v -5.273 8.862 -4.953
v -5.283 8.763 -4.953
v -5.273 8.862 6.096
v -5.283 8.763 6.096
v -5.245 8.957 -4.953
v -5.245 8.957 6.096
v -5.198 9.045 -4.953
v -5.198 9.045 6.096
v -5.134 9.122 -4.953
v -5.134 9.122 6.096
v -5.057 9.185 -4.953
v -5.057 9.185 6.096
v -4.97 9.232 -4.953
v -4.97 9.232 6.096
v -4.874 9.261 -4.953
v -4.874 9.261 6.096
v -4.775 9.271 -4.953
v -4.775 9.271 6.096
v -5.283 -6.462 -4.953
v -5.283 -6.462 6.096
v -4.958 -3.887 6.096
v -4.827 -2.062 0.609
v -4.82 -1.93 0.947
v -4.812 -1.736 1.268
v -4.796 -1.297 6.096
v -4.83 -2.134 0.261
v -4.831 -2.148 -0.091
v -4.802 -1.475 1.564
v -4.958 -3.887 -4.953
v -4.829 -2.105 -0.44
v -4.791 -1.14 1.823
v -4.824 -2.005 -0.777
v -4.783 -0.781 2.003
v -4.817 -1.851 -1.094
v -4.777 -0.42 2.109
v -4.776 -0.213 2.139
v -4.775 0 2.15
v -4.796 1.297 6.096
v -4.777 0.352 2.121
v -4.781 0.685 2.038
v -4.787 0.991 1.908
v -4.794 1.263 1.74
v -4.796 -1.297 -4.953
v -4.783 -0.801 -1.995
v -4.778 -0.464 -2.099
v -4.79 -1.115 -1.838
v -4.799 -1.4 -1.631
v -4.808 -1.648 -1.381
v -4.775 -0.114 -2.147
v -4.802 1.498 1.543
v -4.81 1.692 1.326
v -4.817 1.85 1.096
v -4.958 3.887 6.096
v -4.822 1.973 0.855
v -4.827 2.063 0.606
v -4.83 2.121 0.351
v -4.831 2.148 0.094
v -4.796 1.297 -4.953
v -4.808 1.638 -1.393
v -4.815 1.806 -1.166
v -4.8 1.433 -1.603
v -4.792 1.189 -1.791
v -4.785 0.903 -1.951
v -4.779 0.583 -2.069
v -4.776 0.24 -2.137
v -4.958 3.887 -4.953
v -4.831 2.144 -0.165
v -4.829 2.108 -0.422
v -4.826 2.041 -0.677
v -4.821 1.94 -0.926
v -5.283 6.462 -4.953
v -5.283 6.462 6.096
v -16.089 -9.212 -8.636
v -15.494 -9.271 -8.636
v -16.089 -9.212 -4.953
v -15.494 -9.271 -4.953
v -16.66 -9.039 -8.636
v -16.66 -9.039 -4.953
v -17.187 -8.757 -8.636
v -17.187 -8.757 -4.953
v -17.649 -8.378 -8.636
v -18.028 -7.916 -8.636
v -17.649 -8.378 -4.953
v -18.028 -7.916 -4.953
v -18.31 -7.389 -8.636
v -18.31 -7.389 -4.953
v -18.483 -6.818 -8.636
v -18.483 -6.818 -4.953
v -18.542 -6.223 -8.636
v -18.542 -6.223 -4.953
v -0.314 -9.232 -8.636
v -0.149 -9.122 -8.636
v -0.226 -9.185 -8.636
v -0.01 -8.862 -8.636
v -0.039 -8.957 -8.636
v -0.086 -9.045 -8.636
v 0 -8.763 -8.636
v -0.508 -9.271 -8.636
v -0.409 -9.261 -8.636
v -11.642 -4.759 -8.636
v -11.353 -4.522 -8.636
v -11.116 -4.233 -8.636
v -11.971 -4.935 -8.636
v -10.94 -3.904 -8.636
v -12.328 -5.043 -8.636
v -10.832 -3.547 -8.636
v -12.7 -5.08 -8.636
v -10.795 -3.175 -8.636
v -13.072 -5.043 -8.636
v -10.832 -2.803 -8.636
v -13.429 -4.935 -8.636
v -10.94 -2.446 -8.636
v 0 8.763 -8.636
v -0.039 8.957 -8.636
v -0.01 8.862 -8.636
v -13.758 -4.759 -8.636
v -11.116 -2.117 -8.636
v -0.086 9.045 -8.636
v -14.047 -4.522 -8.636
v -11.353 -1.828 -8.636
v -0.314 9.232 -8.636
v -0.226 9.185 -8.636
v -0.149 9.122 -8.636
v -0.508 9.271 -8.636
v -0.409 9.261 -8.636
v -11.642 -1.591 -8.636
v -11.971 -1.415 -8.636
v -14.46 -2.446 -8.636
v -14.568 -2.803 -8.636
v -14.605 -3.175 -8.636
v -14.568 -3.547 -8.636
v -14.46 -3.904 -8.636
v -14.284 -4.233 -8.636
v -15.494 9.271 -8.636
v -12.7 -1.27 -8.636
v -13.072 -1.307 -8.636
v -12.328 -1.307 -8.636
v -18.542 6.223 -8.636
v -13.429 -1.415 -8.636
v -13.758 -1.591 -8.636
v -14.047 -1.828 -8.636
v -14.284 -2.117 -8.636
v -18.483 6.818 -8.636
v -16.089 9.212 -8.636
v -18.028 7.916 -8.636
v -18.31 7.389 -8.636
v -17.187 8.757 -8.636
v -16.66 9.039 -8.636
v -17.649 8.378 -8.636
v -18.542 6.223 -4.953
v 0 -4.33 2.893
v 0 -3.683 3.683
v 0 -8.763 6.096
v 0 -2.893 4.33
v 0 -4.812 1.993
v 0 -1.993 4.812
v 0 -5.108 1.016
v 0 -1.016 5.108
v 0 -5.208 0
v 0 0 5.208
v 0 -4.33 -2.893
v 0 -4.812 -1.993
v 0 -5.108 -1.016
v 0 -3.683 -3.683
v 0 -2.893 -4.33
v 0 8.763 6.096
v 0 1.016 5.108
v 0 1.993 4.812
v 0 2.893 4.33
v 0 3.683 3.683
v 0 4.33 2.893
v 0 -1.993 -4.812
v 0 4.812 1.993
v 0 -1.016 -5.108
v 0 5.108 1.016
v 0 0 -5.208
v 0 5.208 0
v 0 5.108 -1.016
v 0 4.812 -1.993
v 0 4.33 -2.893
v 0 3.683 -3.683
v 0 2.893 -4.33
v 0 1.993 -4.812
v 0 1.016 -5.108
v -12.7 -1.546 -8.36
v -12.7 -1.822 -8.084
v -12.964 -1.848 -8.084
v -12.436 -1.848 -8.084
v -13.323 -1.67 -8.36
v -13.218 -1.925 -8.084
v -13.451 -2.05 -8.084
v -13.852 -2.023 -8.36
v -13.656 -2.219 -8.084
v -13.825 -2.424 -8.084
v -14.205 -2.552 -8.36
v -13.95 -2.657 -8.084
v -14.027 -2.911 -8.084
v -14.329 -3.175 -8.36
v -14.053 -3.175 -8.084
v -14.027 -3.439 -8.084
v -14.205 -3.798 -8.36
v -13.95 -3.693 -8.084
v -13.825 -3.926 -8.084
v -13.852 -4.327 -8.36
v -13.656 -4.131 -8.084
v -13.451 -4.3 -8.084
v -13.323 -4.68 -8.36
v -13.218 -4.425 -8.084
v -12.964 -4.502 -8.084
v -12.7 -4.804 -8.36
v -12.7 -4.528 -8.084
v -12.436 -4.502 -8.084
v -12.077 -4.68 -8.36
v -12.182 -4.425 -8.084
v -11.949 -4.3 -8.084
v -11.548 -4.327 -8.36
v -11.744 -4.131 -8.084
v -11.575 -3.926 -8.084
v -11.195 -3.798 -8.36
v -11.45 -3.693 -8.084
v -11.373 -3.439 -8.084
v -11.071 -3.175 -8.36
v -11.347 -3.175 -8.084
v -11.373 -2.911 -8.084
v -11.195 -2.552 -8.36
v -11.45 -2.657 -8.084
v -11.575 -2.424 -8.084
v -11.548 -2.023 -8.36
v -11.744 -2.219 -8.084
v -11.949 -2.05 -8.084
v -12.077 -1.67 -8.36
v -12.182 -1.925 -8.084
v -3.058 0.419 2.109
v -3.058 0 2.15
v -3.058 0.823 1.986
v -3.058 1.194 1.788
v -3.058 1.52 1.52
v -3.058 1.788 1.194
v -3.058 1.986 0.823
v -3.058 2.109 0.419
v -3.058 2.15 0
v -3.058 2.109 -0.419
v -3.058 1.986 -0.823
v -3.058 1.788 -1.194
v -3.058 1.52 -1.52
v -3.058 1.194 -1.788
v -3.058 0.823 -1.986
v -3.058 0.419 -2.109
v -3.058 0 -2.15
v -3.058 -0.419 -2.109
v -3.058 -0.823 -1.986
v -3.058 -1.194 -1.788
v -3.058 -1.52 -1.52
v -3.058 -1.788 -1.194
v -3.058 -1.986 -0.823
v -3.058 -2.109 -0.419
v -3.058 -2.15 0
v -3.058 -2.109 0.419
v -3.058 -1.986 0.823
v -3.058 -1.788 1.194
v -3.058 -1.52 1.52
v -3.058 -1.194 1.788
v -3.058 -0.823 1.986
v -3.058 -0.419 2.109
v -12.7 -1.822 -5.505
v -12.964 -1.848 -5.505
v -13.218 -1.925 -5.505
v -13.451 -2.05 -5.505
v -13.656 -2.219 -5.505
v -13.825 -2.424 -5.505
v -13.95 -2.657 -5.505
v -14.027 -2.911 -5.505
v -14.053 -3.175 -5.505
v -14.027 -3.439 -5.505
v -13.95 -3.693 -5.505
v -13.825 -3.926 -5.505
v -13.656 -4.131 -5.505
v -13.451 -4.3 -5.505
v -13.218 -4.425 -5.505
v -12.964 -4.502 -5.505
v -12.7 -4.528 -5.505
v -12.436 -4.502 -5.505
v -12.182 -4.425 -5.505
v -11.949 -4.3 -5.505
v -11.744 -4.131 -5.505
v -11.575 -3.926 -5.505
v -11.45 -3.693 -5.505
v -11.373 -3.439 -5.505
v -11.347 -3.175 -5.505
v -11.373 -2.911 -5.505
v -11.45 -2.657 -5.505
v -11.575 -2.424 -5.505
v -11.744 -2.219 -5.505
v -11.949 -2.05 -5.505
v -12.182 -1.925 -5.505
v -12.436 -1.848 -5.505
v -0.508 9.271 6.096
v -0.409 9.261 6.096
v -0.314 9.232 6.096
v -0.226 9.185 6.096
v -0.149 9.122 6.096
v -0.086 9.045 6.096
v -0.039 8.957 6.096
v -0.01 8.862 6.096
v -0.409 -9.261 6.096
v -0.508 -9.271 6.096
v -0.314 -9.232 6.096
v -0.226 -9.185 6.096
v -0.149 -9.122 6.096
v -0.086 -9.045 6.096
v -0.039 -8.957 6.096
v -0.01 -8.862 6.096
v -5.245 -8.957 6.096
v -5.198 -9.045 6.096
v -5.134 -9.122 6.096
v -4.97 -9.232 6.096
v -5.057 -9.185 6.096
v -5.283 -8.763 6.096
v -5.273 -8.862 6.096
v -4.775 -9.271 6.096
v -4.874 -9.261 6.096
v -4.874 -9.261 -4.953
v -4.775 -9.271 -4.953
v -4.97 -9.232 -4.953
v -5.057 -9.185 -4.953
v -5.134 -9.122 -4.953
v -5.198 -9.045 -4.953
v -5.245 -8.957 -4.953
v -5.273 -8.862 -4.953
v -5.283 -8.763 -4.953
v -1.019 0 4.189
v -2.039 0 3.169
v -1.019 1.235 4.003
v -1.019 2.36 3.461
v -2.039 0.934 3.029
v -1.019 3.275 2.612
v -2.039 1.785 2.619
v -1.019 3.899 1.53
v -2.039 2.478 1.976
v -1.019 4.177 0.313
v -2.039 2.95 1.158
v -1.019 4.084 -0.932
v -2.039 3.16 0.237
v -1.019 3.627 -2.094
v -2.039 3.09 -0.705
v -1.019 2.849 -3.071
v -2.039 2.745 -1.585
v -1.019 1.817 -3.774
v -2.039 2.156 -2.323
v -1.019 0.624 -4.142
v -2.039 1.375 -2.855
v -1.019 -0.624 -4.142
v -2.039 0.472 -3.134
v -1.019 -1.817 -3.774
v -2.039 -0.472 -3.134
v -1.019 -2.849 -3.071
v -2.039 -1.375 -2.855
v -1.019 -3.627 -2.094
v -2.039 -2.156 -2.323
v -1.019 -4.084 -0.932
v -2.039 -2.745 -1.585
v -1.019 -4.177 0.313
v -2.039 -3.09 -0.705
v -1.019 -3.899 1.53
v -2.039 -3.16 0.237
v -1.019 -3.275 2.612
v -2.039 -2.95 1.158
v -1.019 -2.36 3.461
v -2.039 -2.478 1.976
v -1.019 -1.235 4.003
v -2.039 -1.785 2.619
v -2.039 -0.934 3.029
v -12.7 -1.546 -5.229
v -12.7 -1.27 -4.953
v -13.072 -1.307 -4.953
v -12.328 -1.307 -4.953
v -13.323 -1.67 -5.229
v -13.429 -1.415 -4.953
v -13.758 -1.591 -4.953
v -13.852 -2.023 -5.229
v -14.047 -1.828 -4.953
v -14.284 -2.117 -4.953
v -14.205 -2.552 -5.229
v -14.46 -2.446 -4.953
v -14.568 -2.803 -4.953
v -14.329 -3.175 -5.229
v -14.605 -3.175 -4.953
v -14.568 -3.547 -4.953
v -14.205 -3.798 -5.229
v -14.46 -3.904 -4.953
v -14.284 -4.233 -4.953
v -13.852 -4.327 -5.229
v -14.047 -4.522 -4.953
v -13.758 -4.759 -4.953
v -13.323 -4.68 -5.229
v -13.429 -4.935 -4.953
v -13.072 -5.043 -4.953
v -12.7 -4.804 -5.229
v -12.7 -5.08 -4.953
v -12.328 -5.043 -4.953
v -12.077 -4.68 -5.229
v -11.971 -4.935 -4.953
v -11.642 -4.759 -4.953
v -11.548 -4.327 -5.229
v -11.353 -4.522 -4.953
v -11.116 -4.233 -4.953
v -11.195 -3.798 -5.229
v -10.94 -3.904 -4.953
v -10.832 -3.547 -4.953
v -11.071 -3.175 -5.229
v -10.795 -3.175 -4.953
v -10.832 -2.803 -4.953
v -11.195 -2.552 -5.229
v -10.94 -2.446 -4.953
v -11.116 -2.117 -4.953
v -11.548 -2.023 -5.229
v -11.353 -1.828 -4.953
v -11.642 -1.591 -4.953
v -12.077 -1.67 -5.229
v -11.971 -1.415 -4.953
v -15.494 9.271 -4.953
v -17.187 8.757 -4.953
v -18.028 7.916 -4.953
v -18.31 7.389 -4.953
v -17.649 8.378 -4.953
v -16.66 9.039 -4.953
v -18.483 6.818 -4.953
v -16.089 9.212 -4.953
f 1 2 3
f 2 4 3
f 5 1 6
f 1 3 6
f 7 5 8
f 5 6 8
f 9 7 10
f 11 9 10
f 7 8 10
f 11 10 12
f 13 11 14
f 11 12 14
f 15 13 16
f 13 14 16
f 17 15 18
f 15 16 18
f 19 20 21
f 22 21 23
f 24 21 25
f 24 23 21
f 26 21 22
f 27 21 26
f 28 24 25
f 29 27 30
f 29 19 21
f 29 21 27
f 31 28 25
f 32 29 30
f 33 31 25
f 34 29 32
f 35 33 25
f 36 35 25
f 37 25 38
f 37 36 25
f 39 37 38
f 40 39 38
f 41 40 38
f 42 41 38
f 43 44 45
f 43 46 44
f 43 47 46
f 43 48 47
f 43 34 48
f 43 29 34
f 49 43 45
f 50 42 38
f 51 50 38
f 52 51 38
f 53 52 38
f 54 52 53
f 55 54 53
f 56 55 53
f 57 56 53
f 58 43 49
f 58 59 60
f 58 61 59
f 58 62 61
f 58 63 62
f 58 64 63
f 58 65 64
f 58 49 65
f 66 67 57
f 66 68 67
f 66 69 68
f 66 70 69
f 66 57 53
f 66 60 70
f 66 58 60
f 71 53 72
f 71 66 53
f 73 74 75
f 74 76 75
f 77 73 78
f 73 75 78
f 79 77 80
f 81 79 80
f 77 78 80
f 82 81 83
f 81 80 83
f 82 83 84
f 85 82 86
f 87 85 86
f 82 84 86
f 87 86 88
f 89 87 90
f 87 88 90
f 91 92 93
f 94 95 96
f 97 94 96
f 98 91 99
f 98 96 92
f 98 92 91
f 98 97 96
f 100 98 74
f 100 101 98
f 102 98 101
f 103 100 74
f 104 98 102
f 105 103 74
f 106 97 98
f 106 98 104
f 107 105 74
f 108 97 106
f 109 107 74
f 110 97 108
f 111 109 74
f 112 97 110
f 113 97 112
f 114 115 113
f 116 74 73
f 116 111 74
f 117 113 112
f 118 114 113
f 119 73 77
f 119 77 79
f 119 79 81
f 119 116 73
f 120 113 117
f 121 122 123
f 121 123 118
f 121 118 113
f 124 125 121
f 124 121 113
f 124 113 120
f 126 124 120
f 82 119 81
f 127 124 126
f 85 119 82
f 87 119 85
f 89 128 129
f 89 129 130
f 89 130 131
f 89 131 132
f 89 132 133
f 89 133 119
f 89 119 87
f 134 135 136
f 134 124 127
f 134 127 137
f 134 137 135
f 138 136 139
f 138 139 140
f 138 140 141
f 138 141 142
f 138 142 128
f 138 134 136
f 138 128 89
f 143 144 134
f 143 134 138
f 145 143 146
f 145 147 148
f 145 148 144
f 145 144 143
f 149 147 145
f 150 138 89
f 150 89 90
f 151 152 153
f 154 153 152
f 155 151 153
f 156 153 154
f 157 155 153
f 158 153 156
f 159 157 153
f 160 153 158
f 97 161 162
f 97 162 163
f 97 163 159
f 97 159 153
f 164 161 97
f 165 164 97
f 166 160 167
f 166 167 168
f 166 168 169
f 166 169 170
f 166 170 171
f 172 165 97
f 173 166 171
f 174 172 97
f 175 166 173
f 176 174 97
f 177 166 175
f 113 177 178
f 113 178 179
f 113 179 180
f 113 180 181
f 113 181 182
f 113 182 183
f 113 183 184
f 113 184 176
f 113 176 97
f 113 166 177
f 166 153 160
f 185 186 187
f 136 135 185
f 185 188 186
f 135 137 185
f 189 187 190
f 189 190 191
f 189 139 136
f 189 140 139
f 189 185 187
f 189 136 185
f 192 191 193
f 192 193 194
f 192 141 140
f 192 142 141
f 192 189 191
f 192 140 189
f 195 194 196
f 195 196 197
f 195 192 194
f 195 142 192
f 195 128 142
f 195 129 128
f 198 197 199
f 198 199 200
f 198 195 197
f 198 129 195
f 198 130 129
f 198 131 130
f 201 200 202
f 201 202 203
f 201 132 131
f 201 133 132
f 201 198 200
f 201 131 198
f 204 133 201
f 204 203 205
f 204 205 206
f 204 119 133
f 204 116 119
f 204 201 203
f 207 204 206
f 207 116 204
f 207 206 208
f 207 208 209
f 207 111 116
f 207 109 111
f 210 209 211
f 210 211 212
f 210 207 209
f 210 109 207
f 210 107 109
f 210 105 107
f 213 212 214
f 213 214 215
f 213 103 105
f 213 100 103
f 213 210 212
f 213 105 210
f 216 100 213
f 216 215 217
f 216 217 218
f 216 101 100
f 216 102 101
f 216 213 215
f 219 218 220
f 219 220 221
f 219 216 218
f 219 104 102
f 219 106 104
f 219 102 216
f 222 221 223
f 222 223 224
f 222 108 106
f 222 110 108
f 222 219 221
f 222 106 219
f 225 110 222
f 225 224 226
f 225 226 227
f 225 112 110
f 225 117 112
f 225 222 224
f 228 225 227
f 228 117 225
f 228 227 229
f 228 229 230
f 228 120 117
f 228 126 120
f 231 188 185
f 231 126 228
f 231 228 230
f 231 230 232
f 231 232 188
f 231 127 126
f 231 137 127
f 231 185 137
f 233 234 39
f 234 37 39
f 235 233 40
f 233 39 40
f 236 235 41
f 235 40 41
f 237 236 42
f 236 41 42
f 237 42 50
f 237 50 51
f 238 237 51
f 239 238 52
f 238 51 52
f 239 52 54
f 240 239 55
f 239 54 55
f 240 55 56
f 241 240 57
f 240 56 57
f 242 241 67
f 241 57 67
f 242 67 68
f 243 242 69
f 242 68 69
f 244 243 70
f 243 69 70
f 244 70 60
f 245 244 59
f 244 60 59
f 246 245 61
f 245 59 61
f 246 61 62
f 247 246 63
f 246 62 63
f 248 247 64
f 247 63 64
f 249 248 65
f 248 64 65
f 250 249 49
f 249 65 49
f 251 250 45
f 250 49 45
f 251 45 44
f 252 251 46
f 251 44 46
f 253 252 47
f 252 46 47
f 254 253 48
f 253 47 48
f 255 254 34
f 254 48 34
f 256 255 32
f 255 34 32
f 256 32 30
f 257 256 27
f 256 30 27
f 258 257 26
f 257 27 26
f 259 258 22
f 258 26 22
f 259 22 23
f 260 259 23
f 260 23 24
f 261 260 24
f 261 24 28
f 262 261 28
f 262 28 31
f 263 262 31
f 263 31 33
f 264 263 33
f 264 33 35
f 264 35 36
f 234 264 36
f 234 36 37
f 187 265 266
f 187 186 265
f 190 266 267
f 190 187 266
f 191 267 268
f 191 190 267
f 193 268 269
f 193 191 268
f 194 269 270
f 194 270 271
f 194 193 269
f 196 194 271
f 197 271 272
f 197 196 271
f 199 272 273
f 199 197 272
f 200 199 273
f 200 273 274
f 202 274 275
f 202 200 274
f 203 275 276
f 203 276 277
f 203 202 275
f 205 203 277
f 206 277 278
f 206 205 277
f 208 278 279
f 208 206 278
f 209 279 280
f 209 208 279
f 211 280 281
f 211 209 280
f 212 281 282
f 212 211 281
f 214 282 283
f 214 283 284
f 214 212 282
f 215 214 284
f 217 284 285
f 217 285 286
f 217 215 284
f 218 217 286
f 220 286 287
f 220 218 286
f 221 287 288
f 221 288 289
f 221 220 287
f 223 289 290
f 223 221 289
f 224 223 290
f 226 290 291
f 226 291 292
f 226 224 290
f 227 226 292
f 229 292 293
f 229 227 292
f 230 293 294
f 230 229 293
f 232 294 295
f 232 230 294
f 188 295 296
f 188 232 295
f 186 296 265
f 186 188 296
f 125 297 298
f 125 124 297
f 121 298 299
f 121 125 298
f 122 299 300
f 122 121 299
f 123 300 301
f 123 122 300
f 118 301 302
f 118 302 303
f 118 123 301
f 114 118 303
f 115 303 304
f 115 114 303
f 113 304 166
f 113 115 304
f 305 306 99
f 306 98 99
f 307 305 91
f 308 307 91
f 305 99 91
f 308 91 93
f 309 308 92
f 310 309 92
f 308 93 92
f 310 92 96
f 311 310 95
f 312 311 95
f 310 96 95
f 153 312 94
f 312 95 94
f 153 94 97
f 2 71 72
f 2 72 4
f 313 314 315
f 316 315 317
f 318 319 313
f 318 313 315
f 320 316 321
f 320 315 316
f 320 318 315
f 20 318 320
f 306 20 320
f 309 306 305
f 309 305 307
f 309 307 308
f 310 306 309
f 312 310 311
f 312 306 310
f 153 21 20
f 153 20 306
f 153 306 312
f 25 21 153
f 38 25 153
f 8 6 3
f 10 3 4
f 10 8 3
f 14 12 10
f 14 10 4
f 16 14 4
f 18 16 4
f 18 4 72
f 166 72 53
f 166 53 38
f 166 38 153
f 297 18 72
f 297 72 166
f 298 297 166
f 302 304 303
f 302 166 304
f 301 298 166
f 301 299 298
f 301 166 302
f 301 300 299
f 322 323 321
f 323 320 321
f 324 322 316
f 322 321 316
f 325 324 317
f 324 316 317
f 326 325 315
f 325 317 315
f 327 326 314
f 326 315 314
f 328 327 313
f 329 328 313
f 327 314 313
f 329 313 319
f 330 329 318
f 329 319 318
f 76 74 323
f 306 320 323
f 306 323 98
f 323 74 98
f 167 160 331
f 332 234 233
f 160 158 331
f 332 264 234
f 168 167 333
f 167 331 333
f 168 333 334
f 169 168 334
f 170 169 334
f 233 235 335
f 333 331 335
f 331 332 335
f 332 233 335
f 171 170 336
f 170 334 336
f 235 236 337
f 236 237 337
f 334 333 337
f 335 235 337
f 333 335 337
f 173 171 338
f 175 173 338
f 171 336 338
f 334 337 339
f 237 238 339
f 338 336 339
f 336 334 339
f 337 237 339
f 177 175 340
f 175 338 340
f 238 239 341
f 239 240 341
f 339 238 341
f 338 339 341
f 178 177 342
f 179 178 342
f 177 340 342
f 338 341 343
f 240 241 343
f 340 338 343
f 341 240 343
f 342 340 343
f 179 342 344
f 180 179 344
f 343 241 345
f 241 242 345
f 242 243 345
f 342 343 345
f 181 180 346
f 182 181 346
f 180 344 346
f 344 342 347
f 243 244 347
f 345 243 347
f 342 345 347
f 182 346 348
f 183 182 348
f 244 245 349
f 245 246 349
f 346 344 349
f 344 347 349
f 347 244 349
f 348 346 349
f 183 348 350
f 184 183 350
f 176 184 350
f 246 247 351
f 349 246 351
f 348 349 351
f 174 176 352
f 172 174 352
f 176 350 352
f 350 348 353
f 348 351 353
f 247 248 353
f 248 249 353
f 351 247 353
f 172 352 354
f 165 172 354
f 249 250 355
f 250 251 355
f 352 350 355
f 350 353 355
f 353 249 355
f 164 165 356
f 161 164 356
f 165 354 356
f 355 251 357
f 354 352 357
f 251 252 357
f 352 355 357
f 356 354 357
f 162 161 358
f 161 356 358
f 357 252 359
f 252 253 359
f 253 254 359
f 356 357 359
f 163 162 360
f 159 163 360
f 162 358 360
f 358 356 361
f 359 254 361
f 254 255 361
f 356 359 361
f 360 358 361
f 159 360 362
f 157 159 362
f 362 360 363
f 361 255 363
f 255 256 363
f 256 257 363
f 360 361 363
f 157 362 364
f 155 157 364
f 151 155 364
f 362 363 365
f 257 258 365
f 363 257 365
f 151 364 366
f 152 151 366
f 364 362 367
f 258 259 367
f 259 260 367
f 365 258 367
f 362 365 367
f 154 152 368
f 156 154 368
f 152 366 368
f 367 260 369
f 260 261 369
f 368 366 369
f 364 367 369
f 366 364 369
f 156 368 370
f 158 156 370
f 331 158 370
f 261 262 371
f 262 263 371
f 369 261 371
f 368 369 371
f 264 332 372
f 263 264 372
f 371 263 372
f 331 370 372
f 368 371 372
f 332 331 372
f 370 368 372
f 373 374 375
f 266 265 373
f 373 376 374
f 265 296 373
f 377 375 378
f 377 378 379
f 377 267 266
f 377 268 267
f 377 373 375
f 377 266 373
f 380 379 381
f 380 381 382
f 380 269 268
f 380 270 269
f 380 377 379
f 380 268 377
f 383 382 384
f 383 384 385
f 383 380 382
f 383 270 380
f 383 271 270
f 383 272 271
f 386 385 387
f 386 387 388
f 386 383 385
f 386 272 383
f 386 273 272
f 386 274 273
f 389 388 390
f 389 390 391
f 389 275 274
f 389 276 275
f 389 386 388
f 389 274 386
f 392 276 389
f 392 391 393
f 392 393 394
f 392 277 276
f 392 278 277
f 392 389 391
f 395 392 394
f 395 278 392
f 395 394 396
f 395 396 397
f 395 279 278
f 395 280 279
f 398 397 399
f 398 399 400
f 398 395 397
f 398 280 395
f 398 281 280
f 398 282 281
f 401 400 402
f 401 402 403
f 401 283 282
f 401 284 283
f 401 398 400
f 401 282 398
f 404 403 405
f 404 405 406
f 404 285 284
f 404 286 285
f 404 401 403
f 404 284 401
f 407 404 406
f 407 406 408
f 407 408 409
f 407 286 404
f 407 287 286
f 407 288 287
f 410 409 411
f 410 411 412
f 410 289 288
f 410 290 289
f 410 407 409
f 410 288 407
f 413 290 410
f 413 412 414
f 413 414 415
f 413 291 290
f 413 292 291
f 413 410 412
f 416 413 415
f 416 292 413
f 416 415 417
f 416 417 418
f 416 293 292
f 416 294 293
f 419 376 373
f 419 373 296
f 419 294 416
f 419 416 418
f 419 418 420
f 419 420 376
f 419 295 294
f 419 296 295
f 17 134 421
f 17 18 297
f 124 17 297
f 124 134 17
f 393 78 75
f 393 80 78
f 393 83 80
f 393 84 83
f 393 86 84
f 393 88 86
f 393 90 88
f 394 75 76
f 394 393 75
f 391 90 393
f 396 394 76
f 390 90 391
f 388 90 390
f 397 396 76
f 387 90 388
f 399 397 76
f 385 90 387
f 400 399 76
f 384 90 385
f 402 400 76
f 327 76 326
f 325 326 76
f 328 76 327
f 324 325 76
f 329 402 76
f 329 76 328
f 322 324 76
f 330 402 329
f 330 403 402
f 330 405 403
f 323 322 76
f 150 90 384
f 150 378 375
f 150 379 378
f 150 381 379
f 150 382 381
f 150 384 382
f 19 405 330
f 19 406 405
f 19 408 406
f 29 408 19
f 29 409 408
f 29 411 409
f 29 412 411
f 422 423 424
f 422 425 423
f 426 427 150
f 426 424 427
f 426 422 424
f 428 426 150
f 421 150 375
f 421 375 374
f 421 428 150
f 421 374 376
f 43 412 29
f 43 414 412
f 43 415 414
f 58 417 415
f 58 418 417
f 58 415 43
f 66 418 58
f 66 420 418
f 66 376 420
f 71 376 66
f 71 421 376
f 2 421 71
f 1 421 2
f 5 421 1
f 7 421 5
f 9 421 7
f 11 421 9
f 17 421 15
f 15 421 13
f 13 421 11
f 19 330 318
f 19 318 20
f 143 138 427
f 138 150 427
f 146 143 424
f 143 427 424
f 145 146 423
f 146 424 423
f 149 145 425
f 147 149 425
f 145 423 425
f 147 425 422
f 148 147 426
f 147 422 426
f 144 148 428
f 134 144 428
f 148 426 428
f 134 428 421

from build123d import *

# Parameters (mm, degrees)
BOSS_EXTRUDE1_DEPTH                             = 9.271
CUT_EXTRUDE1_DEPTH                              = 24.491224021
CSK_FOR_M4_FLAT_HEAD_MACHINE_SCREW1_D           = 4.3
CSK_FOR_M4_FLAT_HEAD_MACHINE_SCREW1_CSINK_D     = 10.416
CSK_FOR_M4_FLAT_HEAD_MACHINE_SCREW1_CSINK_ANGLE = 90
FILLET2_R                                       = 3.048
FILLET3_R                                       = 0.508


with BuildPart() as part:
    # Sketch1 → Boss-Extrude1 (new, symmetric)
    with BuildSketch(Plane(origin=(0, 0, 0), x_dir=(1, 0, 0), z_dir=(0, 1, 0))):
        Polygon((-18.542, 4.953), (-7.62, 4.953), (-7.62, -6.096), (0, -6.096), (0, 8.636), (-18.542, 8.636), align=None)
    extrude(amount=BOSS_EXTRUDE1_DEPTH, both=True)

    # Sketch2 → Cut-Extrude1 (cut, through all)
    with BuildSketch(Plane(origin=(0, 0, -4.953), x_dir=(-1, 0, 0), z_dir=(0, 0, -1))):
        with BuildLine():
            Line((5.2832, 6.46179195), (5.2832, 15.24))
            Line((5.2832, 15.24), (52.002170663, 15.24))
            Line((52.002170663, 15.24), (52.002170663, -15.24))
            Line((52.002170663, -15.24), (5.2832, -15.24))
            Line((5.2832, -15.24), (5.2832, -6.46179195))
            ThreePointArc((5.2832, -6.46179195), (4.7752, 0), (5.2832, 6.46179195))
        make_face()
    extrude(amount=-CUT_EXTRUDE1_DEPTH, mode=Mode.SUBTRACT)

    # CSK for M4 Flat Head Machine Screw1 (through all)
    with Locations(Plane(origin=(0, 0, 0), x_dir=(0, 0, -1), z_dir=(1, 0, 0))):
        with Locations((0, 0)):
            CounterSinkHole(CSK_FOR_M4_FLAT_HEAD_MACHINE_SCREW1_D / 2, CSK_FOR_M4_FLAT_HEAD_MACHINE_SCREW1_CSINK_D / 2, counter_sink_angle=CSK_FOR_M4_FLAT_HEAD_MACHINE_SCREW1_CSINK_ANGLE)

    # Sketch5 → #6-32 Tapped Hole1 (revolve, cut)
    with BuildSketch(Plane(origin=(-12.7, -3.175, -8.636), x_dir=(0, 1, 0), z_dir=(1, 0, 0))):
        Polygon((0, 0), (0, 3.683), (1.905, 3.683), (1.35255, 3.13055), (1.35255, 0.55245), (1.905, 0), align=None)
    revolve(axis=Axis((-12.7, -3.175, -14.986), (0, 0, 1)), mode=Mode.SUBTRACT)

    # Fillet2
    fillet2_edges = [part.edges().sort_by_distance(p)[0] for p in [
        (-18.542, 9.271, -6.7945),
        (-18.542, -9.271, -6.7945),
    ]]
    fillet(fillet2_edges, radius=FILLET2_R)

    # Fillet3
    fillet3_edges = [part.edges().sort_by_distance(p)[0] for p in [
        (-5.2832, -9.271, 0.5715),
        (-5.2832, 9.271, 0.5715),
        (0, 9.271, -1.27),
        (0, -9.271, -1.27),
    ]]
    fillet(fillet3_edges, radius=FILLET3_R)


solid = part.part
